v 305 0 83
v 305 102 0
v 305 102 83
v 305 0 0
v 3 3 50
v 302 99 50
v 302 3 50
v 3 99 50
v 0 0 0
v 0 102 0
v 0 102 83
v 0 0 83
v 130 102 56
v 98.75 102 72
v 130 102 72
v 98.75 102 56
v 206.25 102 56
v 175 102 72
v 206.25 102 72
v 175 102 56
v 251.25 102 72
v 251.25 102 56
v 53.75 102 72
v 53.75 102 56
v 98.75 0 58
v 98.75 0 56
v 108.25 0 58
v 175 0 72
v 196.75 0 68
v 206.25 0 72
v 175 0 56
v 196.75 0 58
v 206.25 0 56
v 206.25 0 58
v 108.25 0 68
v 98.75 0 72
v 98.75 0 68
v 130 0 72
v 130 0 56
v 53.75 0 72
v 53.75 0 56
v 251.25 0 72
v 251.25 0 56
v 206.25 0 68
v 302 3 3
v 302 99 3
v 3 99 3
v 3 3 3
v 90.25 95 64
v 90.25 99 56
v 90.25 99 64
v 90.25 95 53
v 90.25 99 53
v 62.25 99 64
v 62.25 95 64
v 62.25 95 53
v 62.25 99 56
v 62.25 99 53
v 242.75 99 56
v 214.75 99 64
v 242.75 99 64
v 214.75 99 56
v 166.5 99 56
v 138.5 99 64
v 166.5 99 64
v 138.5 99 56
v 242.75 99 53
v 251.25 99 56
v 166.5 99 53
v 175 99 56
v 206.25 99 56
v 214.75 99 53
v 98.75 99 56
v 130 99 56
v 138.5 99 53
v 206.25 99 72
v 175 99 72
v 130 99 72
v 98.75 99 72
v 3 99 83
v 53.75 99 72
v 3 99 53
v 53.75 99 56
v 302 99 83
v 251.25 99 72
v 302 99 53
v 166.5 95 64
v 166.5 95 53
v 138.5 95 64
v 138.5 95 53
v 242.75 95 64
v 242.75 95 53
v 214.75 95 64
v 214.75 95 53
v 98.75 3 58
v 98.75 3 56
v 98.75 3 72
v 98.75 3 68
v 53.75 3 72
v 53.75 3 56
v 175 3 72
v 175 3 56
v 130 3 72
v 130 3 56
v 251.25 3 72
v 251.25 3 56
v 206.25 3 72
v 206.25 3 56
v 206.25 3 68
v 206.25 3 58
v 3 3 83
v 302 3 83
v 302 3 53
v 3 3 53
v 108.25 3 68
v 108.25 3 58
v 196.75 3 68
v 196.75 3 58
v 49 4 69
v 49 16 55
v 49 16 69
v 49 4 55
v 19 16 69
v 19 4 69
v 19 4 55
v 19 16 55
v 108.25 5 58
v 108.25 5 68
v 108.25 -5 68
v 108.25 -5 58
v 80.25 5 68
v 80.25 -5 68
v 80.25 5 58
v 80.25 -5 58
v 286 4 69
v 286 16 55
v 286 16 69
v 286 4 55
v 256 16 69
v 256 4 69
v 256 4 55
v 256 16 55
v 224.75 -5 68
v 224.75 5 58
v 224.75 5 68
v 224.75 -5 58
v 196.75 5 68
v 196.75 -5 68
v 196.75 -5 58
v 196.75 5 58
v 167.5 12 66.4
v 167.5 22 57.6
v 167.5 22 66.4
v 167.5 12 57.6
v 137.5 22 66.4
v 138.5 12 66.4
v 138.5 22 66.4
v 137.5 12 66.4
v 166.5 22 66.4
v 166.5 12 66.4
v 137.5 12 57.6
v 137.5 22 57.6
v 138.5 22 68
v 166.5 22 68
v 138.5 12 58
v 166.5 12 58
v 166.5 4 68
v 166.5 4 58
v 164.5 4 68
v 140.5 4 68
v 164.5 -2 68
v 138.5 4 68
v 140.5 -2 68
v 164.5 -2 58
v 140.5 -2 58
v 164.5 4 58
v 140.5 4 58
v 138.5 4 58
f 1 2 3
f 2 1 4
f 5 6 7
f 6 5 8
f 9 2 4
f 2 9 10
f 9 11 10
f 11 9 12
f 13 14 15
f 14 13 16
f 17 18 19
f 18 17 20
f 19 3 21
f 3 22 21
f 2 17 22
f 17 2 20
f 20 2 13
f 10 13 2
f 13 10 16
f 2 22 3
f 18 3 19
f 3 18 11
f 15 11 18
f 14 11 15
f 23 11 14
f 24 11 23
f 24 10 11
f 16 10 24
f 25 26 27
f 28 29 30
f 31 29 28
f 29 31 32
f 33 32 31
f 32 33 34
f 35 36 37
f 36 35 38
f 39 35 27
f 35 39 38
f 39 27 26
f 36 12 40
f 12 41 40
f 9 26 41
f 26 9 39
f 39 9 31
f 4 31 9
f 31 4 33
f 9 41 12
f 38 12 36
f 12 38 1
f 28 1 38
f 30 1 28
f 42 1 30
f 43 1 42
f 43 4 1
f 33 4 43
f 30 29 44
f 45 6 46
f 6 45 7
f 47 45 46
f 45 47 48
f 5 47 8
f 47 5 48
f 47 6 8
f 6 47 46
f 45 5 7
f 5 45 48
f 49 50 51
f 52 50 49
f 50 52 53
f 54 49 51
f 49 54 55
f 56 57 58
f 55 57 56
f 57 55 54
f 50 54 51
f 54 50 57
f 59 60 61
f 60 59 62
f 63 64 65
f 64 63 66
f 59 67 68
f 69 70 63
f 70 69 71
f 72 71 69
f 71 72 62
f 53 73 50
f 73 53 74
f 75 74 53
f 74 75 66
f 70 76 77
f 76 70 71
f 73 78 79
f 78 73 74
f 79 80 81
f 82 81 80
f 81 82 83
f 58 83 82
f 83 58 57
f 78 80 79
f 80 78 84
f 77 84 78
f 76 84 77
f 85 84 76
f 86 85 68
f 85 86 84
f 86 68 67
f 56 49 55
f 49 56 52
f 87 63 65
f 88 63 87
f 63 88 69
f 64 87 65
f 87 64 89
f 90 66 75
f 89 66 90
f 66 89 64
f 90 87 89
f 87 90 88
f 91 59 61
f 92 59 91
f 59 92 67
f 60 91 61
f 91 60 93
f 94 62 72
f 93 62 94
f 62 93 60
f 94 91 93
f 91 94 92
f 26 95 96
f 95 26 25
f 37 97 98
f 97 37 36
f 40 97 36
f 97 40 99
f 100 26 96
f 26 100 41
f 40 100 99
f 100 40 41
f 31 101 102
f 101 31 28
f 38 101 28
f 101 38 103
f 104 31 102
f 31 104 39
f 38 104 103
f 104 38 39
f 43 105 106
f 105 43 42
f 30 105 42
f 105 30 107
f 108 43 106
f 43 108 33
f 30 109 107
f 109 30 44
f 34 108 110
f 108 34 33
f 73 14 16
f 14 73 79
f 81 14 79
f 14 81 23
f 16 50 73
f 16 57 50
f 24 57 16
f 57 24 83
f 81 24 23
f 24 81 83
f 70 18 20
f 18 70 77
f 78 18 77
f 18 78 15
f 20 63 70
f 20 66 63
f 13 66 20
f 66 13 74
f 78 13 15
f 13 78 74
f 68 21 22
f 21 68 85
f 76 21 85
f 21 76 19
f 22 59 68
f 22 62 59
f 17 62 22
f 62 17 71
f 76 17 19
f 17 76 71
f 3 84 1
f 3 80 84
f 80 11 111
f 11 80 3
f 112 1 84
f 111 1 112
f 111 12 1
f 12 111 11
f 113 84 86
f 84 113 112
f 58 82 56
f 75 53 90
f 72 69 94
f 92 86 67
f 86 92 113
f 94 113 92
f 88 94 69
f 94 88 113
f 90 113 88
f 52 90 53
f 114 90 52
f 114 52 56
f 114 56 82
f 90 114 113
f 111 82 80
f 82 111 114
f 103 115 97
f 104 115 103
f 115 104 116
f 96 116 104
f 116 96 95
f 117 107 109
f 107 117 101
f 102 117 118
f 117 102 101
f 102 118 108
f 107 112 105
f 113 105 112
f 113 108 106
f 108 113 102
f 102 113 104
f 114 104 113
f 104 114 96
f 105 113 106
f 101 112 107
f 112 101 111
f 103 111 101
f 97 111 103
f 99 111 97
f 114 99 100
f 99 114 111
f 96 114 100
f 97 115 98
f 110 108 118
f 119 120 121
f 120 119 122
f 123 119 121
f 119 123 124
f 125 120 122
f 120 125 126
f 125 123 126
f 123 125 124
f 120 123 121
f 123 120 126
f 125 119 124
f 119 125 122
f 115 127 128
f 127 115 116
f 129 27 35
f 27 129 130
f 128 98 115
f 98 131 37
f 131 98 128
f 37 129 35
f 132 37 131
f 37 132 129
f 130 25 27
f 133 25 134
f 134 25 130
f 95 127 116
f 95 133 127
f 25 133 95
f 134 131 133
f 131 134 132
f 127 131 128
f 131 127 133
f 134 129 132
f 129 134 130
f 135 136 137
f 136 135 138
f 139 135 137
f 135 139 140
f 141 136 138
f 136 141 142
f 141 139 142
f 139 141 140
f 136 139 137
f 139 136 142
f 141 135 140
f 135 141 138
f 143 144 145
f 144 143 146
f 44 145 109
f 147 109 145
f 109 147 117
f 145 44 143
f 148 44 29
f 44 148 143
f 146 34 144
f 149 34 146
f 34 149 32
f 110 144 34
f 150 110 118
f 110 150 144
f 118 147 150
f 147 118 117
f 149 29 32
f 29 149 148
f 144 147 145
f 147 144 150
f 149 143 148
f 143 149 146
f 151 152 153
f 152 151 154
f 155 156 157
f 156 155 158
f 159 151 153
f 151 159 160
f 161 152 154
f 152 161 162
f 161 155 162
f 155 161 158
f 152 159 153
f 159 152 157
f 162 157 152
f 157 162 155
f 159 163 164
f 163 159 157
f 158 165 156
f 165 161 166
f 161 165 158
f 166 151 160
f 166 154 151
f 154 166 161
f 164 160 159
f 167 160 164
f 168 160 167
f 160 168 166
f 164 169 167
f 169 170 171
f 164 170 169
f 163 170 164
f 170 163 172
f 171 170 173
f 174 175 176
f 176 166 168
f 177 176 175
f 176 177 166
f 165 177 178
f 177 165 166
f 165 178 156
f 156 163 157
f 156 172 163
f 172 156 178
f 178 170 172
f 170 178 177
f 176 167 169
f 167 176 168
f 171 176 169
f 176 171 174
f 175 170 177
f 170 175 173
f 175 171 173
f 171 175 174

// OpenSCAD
// 05_endslide_hooks.scad
// Variant 5: End-operated slide bar (SHORT-END actuators) + front passive windows
// Instead of one long bar, TWO short sliders live inside the short-end walls
// (x=0 and x=305 faces). Each slider has a tongue that engages the NEAREST
// front window when pushed inward from the end (+X / -X).
// A third central tongue is driven by a connecting link.
// This variant shows the short-end operated version as an alternative to
// pure front operation; it can be useful when the front is very tight.
//
// Simplification for clarity: each short-end slider drives 1 tongue each;
// center tongue is on a separate push-in mini-tab at center front.
//
// lock=0: end sliders retracted, tongues clear
// lock=1: end sliders pushed in TRAVEL mm, tongues in windows

lock = 1;
$fn = 48;

// ── Geometry ───────────────────────────────────────────────────────────────
TW = 305; TD = 102; TH_NEW = 50; TH_TOP = 33; WALL = 3;
TOP_BASE_Z = TH_NEW;
WIN_W = 45; WIN_H = 16; WIN_Z_CTR = 64;
WIN_Z_BOT = WIN_Z_CTR - WIN_H/2;
WIN_XS = [TW*1/4, TW*2/4, TW*3/4];

// ── End-slider parameters ──────────────────────────────────────────────────
TONGUE_W = 28; TONGUE_H = 10; TONGUE_L = 8; // tongue into front window (Y)
TRAVEL   = 18; // X inward travel to align tongue with window

// End-slider body: rides inside X-axis channel near front of new tray top
SL_W = TRAVEL + 12; // X length of slider body
SL_H = TONGUE_H + 4; SL_D = 12; // Z, Y of slider
SL_Z0 = WIN_Z_BOT - 1;

// Channel for end slider (open at short face)
CH_H = SL_H + 1.2; CH_D = SL_D + 1.2;
CH_X_L = -0.1;           // left channel: from x=-0 inward
CH_X_R = TW - SL_W - 4;  // right channel starts here

CL = 1.0;

// Center mini-tab (third tongue)
CTR_W = 30; CTR_H = 10; CTR_D = 10; // push-in center tab
CTR_TRAVEL = 9;

// Rear posts
POST_W = 28; POST_H = 14; POST_D = 4;

COL_NEW  = "#1565C0"; COL_TOP = "#90A4AE"; COL_BOLT = "#F9A825";

module new_tray() {
    color(COL_NEW) union() {
        difference() {
            cube([TW, TD, TH_NEW]);
            translate([WALL, WALL, WALL])
                cube([TW-2*WALL, TD-2*WALL, TH_NEW-WALL+0.1]);
            // LEFT end-slider channel (open at x=0)
            translate([CH_X_L, WALL, SL_Z0 - CL])
                cube([SL_W + TRAVEL + 2, CH_D, CH_H]);
            // RIGHT end-slider channel (open at x=TW)
            translate([TW - SL_W - TRAVEL - 2, WALL, SL_Z0 - CL])
                cube([SL_W + TRAVEL + 2 + 0.1, CH_D, CH_H]);
            // center push-tab slot (open at y=0)
            translate([TW/2 - CTR_W/2 - CL, -0.1, WIN_Z_BOT + CL])
                cube([CTR_W+2*CL, WALL + CTR_TRAVEL + 2, CTR_H]);
            // tongue slots in front wall for each window
            for (wx = WIN_XS)
                translate([wx - TONGUE_W/2 - CL, -0.1, WIN_Z_BOT + CL])
                    cube([TONGUE_W+2*CL, WALL+0.2, TONGUE_H]);
        }
        // Rear capture posts
        for (wx = WIN_XS)
            translate([wx - POST_W/2, TD - WALL - POST_D, TH_NEW])
                cube([POST_W, POST_D, POST_H]);
        // End-wall trim (outer faces of short sides)
        // No protrusion – short side wall at x=0 and x=TW is already WALL thick
    }
}

module top_tray() {
    color(COL_TOP) translate([0,0,TOP_BASE_Z]) difference() {
        cube([TW, TD, TH_TOP]);
        translate([WALL, WALL, WALL]) cube([TW-2*WALL, TD-2*WALL, TH_TOP]);
        for (wx = WIN_XS)
            translate([wx-WIN_W/2, -0.1, WIN_Z_BOT-TOP_BASE_Z]) cube([WIN_W, WALL+0.2, WIN_H]);
        for (wx = WIN_XS)
            translate([wx-WIN_W/2, TD-WALL-0.1, WIN_Z_BOT-TOP_BASE_Z]) cube([WIN_W, WALL+0.2, WIN_H]);
    }
}

module end_slider_left(off_x) {
    // slides in +X direction to lock (tongue enters left front window)
    color(COL_BOLT)
    translate([off_x, 0, 0]) {
        // slider body
        translate([CL, WALL + CL, SL_Z0])
            cube([SL_W, SL_D, SL_H]);
        // tongue projecting toward −Y through front wall
        translate([WIN_XS[0] - TONGUE_W/2, WALL - TONGUE_L, WIN_Z_BOT + 2])
            cube([TONGUE_W, TONGUE_L + 2, TONGUE_H]);
        // grip tab at x=0 face
        translate([CL, WALL + CL, SL_Z0]) cube([4, SL_D, SL_H]);
    }
}

module end_slider_right(off_x) {
    // slides in -X direction to lock (tongue enters right front window)
    color(COL_BOLT)
    translate([off_x, 0, 0]) {
        translate([TW - SL_W - CL, WALL + CL, SL_Z0])
            cube([SL_W, SL_D, SL_H]);
        translate([WIN_XS[2] - TONGUE_W/2, WALL - TONGUE_L, WIN_Z_BOT + 2])
            cube([TONGUE_W, TONGUE_L + 2, TONGUE_H]);
        translate([TW - CL - 4, WALL + CL, SL_Z0]) cube([4, SL_D, SL_H]);
    }
}

module center_tab(off_y) {
    color(COL_BOLT)
    translate([0, off_y, 0]) {
        // push-in mini bar for center window
        translate([TW/2 - CTR_W/2, WALL, WIN_Z_BOT + CL + 0.6])
            cube([CTR_W, CTR_D, CTR_H - 1.2]);
        // tongue through front wall
        translate([WIN_XS[1] - TONGUE_W/2, WALL - TONGUE_L, WIN_Z_BOT + 2])
            cube([TONGUE_W, TONGUE_L + CTR_D, TONGUE_H]);
        // grip tab
        translate([TW/2 - 12, WALL - TONGUE_L - 6, WIN_Z_BOT + 2])
            cube([24, 6, TONGUE_H]);
    }
}

// ── Assembly ───────────────────────────────────────────────────────────────
sl_off_l = (lock == 1) ? TRAVEL : 0;
sl_off_r = (lock == 1) ? -TRAVEL : 0;
ctr_off  = (lock == 1) ? CTR_TRAVEL : 0;

new_tray();
top_tray();
end_slider_left(sl_off_l);
end_slider_right(sl_off_r);
center_tab(ctr_off);
